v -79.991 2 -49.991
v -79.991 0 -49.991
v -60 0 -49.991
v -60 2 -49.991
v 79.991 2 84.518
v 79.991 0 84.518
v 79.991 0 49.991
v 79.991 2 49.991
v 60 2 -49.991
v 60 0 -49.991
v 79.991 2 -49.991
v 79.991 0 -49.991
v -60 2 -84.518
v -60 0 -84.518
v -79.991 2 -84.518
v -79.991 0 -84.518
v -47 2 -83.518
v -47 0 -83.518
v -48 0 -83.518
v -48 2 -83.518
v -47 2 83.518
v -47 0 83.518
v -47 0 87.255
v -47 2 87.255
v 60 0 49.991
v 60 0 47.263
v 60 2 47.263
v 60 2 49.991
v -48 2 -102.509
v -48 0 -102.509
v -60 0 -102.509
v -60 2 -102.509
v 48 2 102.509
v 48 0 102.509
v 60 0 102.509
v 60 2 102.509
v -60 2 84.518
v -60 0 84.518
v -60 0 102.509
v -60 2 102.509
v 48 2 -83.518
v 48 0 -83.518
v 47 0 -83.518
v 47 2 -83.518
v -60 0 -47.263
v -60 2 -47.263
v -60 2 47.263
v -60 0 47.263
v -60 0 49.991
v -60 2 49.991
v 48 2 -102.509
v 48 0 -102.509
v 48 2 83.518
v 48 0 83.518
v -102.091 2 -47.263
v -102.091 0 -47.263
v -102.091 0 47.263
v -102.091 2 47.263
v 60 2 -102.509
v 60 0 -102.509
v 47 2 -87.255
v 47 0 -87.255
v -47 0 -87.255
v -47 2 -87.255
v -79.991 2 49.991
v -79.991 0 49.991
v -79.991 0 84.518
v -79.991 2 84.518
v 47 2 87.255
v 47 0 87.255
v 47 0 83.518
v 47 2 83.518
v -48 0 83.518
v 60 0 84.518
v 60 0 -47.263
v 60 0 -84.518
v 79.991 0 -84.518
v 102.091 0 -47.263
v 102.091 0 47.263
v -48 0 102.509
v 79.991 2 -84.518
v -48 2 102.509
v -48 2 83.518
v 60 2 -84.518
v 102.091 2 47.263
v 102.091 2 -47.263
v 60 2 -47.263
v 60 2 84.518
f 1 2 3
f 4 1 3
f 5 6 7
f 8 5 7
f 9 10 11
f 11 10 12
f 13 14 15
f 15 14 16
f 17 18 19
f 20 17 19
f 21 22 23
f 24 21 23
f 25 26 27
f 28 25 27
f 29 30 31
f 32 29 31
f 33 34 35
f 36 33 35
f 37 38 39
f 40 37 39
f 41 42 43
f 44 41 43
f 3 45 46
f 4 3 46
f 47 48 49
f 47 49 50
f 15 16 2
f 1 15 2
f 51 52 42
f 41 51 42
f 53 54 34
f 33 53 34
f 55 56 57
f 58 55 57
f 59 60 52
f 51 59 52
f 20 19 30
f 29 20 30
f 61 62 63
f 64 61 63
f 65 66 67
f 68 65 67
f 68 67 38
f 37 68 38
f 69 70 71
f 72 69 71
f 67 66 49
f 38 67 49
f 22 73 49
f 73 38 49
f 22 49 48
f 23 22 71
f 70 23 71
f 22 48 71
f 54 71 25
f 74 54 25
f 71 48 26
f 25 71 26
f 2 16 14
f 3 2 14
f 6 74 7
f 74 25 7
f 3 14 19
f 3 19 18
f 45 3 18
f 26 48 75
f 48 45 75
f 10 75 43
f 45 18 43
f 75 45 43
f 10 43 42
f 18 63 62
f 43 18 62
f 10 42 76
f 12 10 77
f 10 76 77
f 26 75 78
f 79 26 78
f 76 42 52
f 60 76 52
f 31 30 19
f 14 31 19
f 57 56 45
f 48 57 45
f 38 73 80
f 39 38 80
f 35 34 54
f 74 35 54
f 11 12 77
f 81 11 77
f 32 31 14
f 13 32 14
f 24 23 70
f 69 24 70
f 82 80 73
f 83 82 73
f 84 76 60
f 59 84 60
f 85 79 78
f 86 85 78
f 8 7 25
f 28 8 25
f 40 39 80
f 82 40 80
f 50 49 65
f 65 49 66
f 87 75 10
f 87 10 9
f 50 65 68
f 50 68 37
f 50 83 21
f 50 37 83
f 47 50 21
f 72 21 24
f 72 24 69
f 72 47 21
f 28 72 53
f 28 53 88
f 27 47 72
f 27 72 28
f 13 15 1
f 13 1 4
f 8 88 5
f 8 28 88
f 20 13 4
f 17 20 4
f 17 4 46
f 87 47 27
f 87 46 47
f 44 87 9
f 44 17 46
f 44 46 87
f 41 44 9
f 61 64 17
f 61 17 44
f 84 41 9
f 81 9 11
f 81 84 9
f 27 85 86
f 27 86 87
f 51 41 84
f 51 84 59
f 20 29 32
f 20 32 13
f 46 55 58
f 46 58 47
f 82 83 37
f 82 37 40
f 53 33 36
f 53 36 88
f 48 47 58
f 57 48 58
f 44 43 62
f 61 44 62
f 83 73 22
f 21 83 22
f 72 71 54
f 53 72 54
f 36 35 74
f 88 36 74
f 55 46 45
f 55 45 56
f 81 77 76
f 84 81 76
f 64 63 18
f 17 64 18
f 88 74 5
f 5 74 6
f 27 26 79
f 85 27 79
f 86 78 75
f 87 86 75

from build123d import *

# Parameters (mm, degrees)
SKETCH1_W                      = 120
SKETCH1_H                      = 100
BASE_FLANGE1_DEPTH             = 2
EDGE_FLANGE1_STRIP_W           = 9.4732
EDGE_FLANGE1_STRIP_H           = 2
EDGE_FLANGE1_STRIP_CUT_DEPTH   = 120
EDGE_FLANGE1_STRIP_2_W         = 9.4732
EDGE_FLANGE1_STRIP_2_H         = 2
EDGE_FLANGE1_STRIP_CUT_2_DEPTH = 120
EDGE_FLANGE1_DEPTH             = 120
EDGE_FLANGE1_BEND_DEPTH        = 120
EDGE_FLANGE2_DEPTH             = 94.5268
EDGE_FLANGE2_BEND_DEPTH        = 94.5268
EDGE_FLANGE5_STRIP_W           = 9.4732
EDGE_FLANGE5_STRIP_H           = 2
EDGE_FLANGE5_STRIP_CUT_DEPTH   = 12
EDGE_FLANGE5_RELIEF_W          = 10.4732
EDGE_FLANGE5_RELIEF_H          = 1
EDGE_FLANGE5_RELIEF_CUT_DEPTH  = 2
EDGE_FLANGE5_DEPTH             = 12
EDGE_FLANGE6_STRIP_W           = 9.4732
EDGE_FLANGE6_STRIP_H           = 2
EDGE_FLANGE6_STRIP_CUT_DEPTH   = 12
EDGE_FLANGE6_RELIEF_W          = 10.4732
EDGE_FLANGE6_RELIEF_H          = 1
EDGE_FLANGE6_RELIEF_CUT_DEPTH  = 2
EDGE_FLANGE6_DEPTH             = 12
EDGE_FLANGE7_STRIP_W           = 9.4732
EDGE_FLANGE7_STRIP_H           = 2
EDGE_FLANGE7_STRIP_CUT_DEPTH   = 12
EDGE_FLANGE7_RELIEF_W          = 10.4732
EDGE_FLANGE7_RELIEF_H          = 1
EDGE_FLANGE7_RELIEF_CUT_DEPTH  = 2
EDGE_FLANGE7_DEPTH             = 12
EDGE_FLANGE8_STRIP_W           = 9.4732
EDGE_FLANGE8_STRIP_H           = 2
EDGE_FLANGE8_STRIP_CUT_DEPTH   = 12
EDGE_FLANGE8_RELIEF_W          = 10.4732
EDGE_FLANGE8_RELIEF_H          = 1
EDGE_FLANGE8_RELIEF_CUT_DEPTH  = 2
EDGE_FLANGE8_DEPTH             = 12
EDGE_FLANGE9_DEPTH             = 34.5268
EDGE_FLANGE9_BEND_DEPTH        = 34.5268
EDGE_FLANGE9_BEND_2_DEPTH      = 34.5268
EDGE_FLANGE9_BEND_3_DEPTH      = 34.5268
UNFOLD1_START                  = 2
UNFOLD1_DEPTH                  = 38
UNFOLD1_2_DEPTH                = 2


# Read off the part's stored shape, not the designer's step: Unfold1
# Sheet-metal steps are written as plain solids
with BuildPart() as part:
    # Sketch1 → Base-Flange1 (new body)
    with BuildSketch(Plane(origin=(0, 0, 0), x_dir=(1, 0, 0), z_dir=(0, 1, 0))):
        Rectangle(SKETCH1_W, SKETCH1_H)
    extrude(amount=BASE_FLANGE1_DEPTH)

    # Edge-Flange1 strip (across the edge) → Edge-Flange1 strip cut (cut)
    with BuildSketch(Plane(origin=(60, 2, -50), x_dir=(0, 0, 1), z_dir=(-1, 0, 0))):
        with Locations((-2, -1)):
            Rectangle(EDGE_FLANGE1_STRIP_W, EDGE_FLANGE1_STRIP_H)
    extrude(amount=EDGE_FLANGE1_STRIP_CUT_DEPTH, mode=Mode.SUBTRACT)

    # Edge-Flange1 strip 2 (across the edge) → Edge-Flange1 strip cut 2 (cut)
    with BuildSketch(Plane(origin=(-60, 2, 50), x_dir=(0, 0, -1), z_dir=(1, 0, 0))):
        with Locations((-2, -1)):
            Rectangle(EDGE_FLANGE1_STRIP_2_W, EDGE_FLANGE1_STRIP_2_H)
    extrude(amount=EDGE_FLANGE1_STRIP_CUT_2_DEPTH, mode=Mode.SUBTRACT)

    # Edge-Flange1 section (across the edge) → Edge-Flange1 (add)
    with BuildSketch(Plane(origin=(60, 2, -50), x_dir=(0, 0, 1), z_dir=(-1, 0, 0))):
        with BuildLine():
            Line((0, 0.7366), (0, 38))
            Line((0, 38), (2, 38))
            Line((2, 38), (2, 0.7366))
            ThreePointArc((2, 0.7366), (2.215745145, 0.215745145), (2.7366, 0))
            Line((2.7366, 0), (2.7366, -2))
            ThreePointArc((2.7366, -2), (0.801531583, -1.198468417), (0, 0.7366))
        make_face()
    extrude(amount=EDGE_FLANGE1_DEPTH)

    # Edge-Flange1 section 2 (across the edge) → Edge-Flange1 bend (add)
    with BuildSketch(Plane(origin=(-60, 2, 50), x_dir=(0, 0, -1), z_dir=(1, 0, 0))):
        with BuildLine():
            Line((0, 0.7366), (0, 38))
            Line((0, 38), (2, 38))
            Line((2, 38), (2, 0.7366))
            ThreePointArc((2, 0.7366), (2.215745145, 0.215745145), (2.7366, 0))
            Line((2.7366, 0), (2.7366, -2))
            ThreePointArc((2.7366, -2), (0.801531583, -1.198468417), (0, 0.7366))
        make_face()
    extrude(amount=EDGE_FLANGE1_BEND_DEPTH)

    # Edge-Flange2 section (across the edge) → Edge-Flange2 (add)
    with BuildSketch(Plane(origin=(-62.8366, 2, -47.2634), x_dir=(1, 0, 0), z_dir=(0, 0, 1))):
        with BuildLine():
            Line((-2, 0.7366), (-2, 38))
            Line((-2, 38), (0, 38))
            Line((0, 38), (0, 0.7366))
            ThreePointArc((0, 0.7366), (0.215745145, 0.215745145), (0.7366, 0))
            Line((0.7366, 0), (2.8366, 0))
            Line((2.8366, 0), (2.8366, -2))
            Line((2.8366, -2), (0.7366, -2))
            ThreePointArc((0.7366, -2), (-1.198468417, -1.198468417), (-2, 0.7366))
        make_face()
    extrude(amount=EDGE_FLANGE2_DEPTH)

    # Edge-Flange2 section 2 (across the edge) → Edge-Flange2 bend (add)
    with BuildSketch(Plane(origin=(62.8366, 2, 47.2634), x_dir=(-1, 0, 0), z_dir=(0, 0, -1))):
        with BuildLine():
            Line((-2, 0.7366), (-2, 38))
            Line((-2, 38), (0, 38))
            Line((0, 38), (0, 0.7366))
            ThreePointArc((0, 0.7366), (0.215745145, 0.215745145), (0.7366, 0))
            Line((0.7366, 0), (2.8366, 0))
            Line((2.8366, 0), (2.8366, -2))
            Line((2.8366, -2), (0.7366, -2))
            ThreePointArc((0.7366, -2), (-1.198468417, -1.198468417), (-2, 0.7366))
        make_face()
    extrude(amount=EDGE_FLANGE2_BEND_DEPTH)

    # Edge-Flange5 strip (across the edge) → Edge-Flange5 strip cut (cut)
    with BuildSketch(Plane(origin=(48, 40, 48), x_dir=(0, -1, 0), z_dir=(1, 0, 0))):
        with Locations((-2, -1)):
            Rectangle(EDGE_FLANGE5_STRIP_W, EDGE_FLANGE5_STRIP_H)
    extrude(amount=EDGE_FLANGE5_STRIP_CUT_DEPTH, mode=Mode.SUBTRACT)

    # Edge-Flange5 relief (on the sheet) → Edge-Flange5 relief cut (cut)
    with BuildSketch(Plane(origin=(48, 37.2634, 48), x_dir=(0, -1, 0), z_dir=(0, 0, -1))):
        with Locations((-4.2366, 0.5)):
            Rectangle(EDGE_FLANGE5_RELIEF_W, EDGE_FLANGE5_RELIEF_H)
    extrude(amount=-EDGE_FLANGE5_RELIEF_CUT_DEPTH, mode=Mode.SUBTRACT)

    # Edge-Flange5 section (across the edge) → Edge-Flange5 (add)
    with BuildSketch(Plane(origin=(48, 40, 48), x_dir=(0, -1, 0), z_dir=(1, 0, 0))):
        with BuildLine():
            Line((0, 0.7366), (0, 16))
            Line((0, 16), (2, 16))
            Line((2, 16), (2, 0.7366))
            ThreePointArc((2, 0.7366), (2.215745145, 0.215745145), (2.7366, 0))
            Line((2.7366, 0), (2.7366, -2))
            ThreePointArc((2.7366, -2), (0.801531583, -1.198468417), (0, 0.7366))
        make_face()
    extrude(amount=EDGE_FLANGE5_DEPTH)

    # Edge-Flange6 strip (across the edge) → Edge-Flange6 strip cut (cut)
    with BuildSketch(Plane(origin=(-60, 40, 48), x_dir=(0, -1, 0), z_dir=(1, 0, 0))):
        with Locations((-2, -1)):
            Rectangle(EDGE_FLANGE6_STRIP_W, EDGE_FLANGE6_STRIP_H)
    extrude(amount=EDGE_FLANGE6_STRIP_CUT_DEPTH, mode=Mode.SUBTRACT)

    # Edge-Flange6 relief (on the sheet) → Edge-Flange6 relief cut (cut)
    with BuildSketch(Plane(origin=(-60, 37.2634, 48), x_dir=(0, -1, 0), z_dir=(0, 0, -1))):
        with Locations((-4.2366, -12.5)):
            Rectangle(EDGE_FLANGE6_RELIEF_W, EDGE_FLANGE6_RELIEF_H)
    extrude(amount=-EDGE_FLANGE6_RELIEF_CUT_DEPTH, mode=Mode.SUBTRACT)

    # Edge-Flange6 section (across the edge) → Edge-Flange6 (add)
    with BuildSketch(Plane(origin=(-60, 40, 48), x_dir=(0, -1, 0), z_dir=(1, 0, 0))):
        with BuildLine():
            Line((0, 0.7366), (0, 16))
            Line((0, 16), (2, 16))
            Line((2, 16), (2, 0.7366))
            ThreePointArc((2, 0.7366), (2.215745145, 0.215745145), (2.7366, 0))
            Line((2.7366, 0), (2.7366, -2))
            ThreePointArc((2.7366, -2), (0.801531583, -1.198468417), (0, 0.7366))
        make_face()
    extrude(amount=EDGE_FLANGE6_DEPTH)

    # Edge-Flange7 strip (across the edge) → Edge-Flange7 strip cut (cut)
    with BuildSketch(Plane(origin=(-48, 40, -48), x_dir=(0, -1, 0), z_dir=(-1, 0, 0))):
        with Locations((-2, -1)):
            Rectangle(EDGE_FLANGE7_STRIP_W, EDGE_FLANGE7_STRIP_H)
    extrude(amount=EDGE_FLANGE7_STRIP_CUT_DEPTH, mode=Mode.SUBTRACT)

    # Edge-Flange7 relief (on the sheet) → Edge-Flange7 relief cut (cut)
    with BuildSketch(Plane(origin=(-48, 37.2634, -48), x_dir=(0, -1, 0), z_dir=(0, 0, 1))):
        with Locations((-4.2366, 0.5)):
            Rectangle(EDGE_FLANGE7_RELIEF_W, EDGE_FLANGE7_RELIEF_H)
    extrude(amount=-EDGE_FLANGE7_RELIEF_CUT_DEPTH, mode=Mode.SUBTRACT)

    # Edge-Flange7 section (across the edge) → Edge-Flange7 (add)
    with BuildSketch(Plane(origin=(-48, 40, -48), x_dir=(0, -1, 0), z_dir=(-1, 0, 0))):
        with BuildLine():
            Line((0, 0.7366), (0, 16))
            Line((0, 16), (2, 16))
            Line((2, 16), (2, 0.7366))
            ThreePointArc((2, 0.7366), (2.215745145, 0.215745145), (2.7366, 0))
            Line((2.7366, 0), (2.7366, -2))
            ThreePointArc((2.7366, -2), (0.801531583, -1.198468417), (0, 0.7366))
        make_face()
    extrude(amount=EDGE_FLANGE7_DEPTH)

    # Edge-Flange8 strip (across the edge) → Edge-Flange8 strip cut (cut)
    with BuildSketch(Plane(origin=(60, 40, -48), x_dir=(0, -1, 0), z_dir=(-1, 0, 0))):
        with Locations((-2, -1)):
            Rectangle(EDGE_FLANGE8_STRIP_W, EDGE_FLANGE8_STRIP_H)
    extrude(amount=EDGE_FLANGE8_STRIP_CUT_DEPTH, mode=Mode.SUBTRACT)

    # Edge-Flange8 relief (on the sheet) → Edge-Flange8 relief cut (cut)
    with BuildSketch(Plane(origin=(60, 37.2634, -48), x_dir=(0, -1, 0), z_dir=(0, 0, 1))):
        with Locations((-4.2366, -12.5)):
            Rectangle(EDGE_FLANGE8_RELIEF_W, EDGE_FLANGE8_RELIEF_H)
    extrude(amount=-EDGE_FLANGE8_RELIEF_CUT_DEPTH, mode=Mode.SUBTRACT)

    # Edge-Flange8 section (across the edge) → Edge-Flange8 (add)
    with BuildSketch(Plane(origin=(60, 40, -48), x_dir=(0, -1, 0), z_dir=(-1, 0, 0))):
        with BuildLine():
            Line((0, 0.7366), (0, 16))
            Line((0, 16), (2, 16))
            Line((2, 16), (2, 0.7366))
            ThreePointArc((2, 0.7366), (2.215745145, 0.215745145), (2.7366, 0))
            Line((2.7366, 0), (2.7366, -2))
            ThreePointArc((2.7366, -2), (0.801531583, -1.198468417), (0, 0.7366))
        make_face()
    extrude(amount=EDGE_FLANGE8_DEPTH)

    # Edge-Flange9 section (across the edge) → Edge-Flange9 (add)
    with BuildSketch(Plane(origin=(60.7366, 37.2634, 48), x_dir=(-1, 0, 0), z_dir=(0, -1, 0))):
        with BuildLine():
            Line((-2, 0.7366), (-2, 18))
            Line((-2, 18), (0, 18))
            Line((0, 18), (0, 0.7366))
            ThreePointArc((0, 0.7366), (0.215745145, 0.215745145), (0.7366, 0))
            Line((0.7366, 0), (0.7366, -2))
            ThreePointArc((0.7366, -2), (-1.198468417, -1.198468417), (-2, 0.7366))
        make_face()
    extrude(amount=EDGE_FLANGE9_DEPTH)

    # Edge-Flange9 section 2 (across the edge) → Edge-Flange9 bend (add)
    with BuildSketch(Plane(origin=(60.7366, 2.7366, -48), x_dir=(-1, 0, 0), z_dir=(0, 1, 0))):
        with BuildLine():
            Line((-2, 0.7366), (-2, 18))
            Line((-2, 18), (0, 18))
            Line((0, 18), (0, 0.7366))
            ThreePointArc((0, 0.7366), (0.215745145, 0.215745145), (0.7366, 0))
            Line((0.7366, 0), (0.7366, -2))
            ThreePointArc((0.7366, -2), (-1.198468417, -1.198468417), (-2, 0.7366))
        make_face()
    extrude(amount=EDGE_FLANGE9_BEND_DEPTH)

    # Edge-Flange9 section 3 (across the edge) → Edge-Flange9 bend 2 (add)
    with BuildSketch(Plane(origin=(-60.7366, 37.2634, -48), x_dir=(1, 0, 0), z_dir=(0, -1, 0))):
        with BuildLine():
            Line((-2, 0.7366), (-2, 18))
            Line((-2, 18), (0, 18))
            Line((0, 18), (0, 0.7366))
            ThreePointArc((0, 0.7366), (0.215745145, 0.215745145), (0.7366, 0))
            Line((0.7366, 0), (0.7366, -2))
            ThreePointArc((0.7366, -2), (-1.198468417, -1.198468417), (-2, 0.7366))
        make_face()
    extrude(amount=EDGE_FLANGE9_BEND_2_DEPTH)

    # Edge-Flange9 section 4 (across the edge) → Edge-Flange9 bend 3 (add)
    with BuildSketch(Plane(origin=(-60.7366, 2.7366, 48), x_dir=(1, 0, 0), z_dir=(0, 1, 0))):
        with BuildLine():
            Line((-2, 0.7366), (-2, 18))
            Line((-2, 18), (0, 18))
            Line((0, 18), (0, 0.7366))
            ThreePointArc((0, 0.7366), (0.215745145, 0.215745145), (0.7366, 0))
            Line((0.7366, 0), (0.7366, -2))
            ThreePointArc((0.7366, -2), (-1.198468417, -1.198468417), (-2, 0.7366))
        make_face()
    extrude(amount=EDGE_FLANGE9_BEND_3_DEPTH)

    # Unfold1 outline → Unfold1 (cut)
    with BuildSketch(Plane(origin=(0, 0, 0), x_dir=(1, 0, 0), z_dir=(0, 1, 0)).offset(UNFOLD1_START)):
        with BuildLine():
            Line((62.7366, -47.2634), (64.8366, -47.2634))
            Line((64.8366, -47.2634), (64.8366, 47.2634))
            Line((64.8366, 47.2634), (62.7366, 47.2634))
            ThreePointArc((62.7366, 47.2634), (61.935068417, 49.198468417), (60, 50))
            Line((60, 50), (-60, 50))
            ThreePointArc((-60, 50), (-61.935068417, 49.198468417), (-62.7366, 47.2634))
            Line((-62.7366, 47.2634), (-64.8366, 47.2634))
            Line((-64.8366, 47.2634), (-64.8366, -47.2634))
            Line((-64.8366, -47.2634), (-62.7366, -47.2634))
            ThreePointArc((-62.7366, -47.2634), (-61.935068417, -49.198468417), (-60, -50))
            Line((-60, -50), (60, -50))
            ThreePointArc((60, -50), (61.935068417, -49.198468417), (62.7366, -47.2634))
        make_face()
        with BuildLine():
            ThreePointArc((60.7366, -47.2634), (60.520854855, -47.784254855), (60, -48))
            Line((60, -48), (60, -47.2634))
            Line((60, -47.2634), (60.7366, -47.2634))
        make_face(mode=Mode.SUBTRACT)
        with BuildLine():
            Line((-60.7366, -47.2634), (-60, -47.2634))
            Line((-60, -47.2634), (-60, -48))
            ThreePointArc((-60, -48), (-60.520854855, -47.784254855), (-60.7366, -47.2634))
        make_face(mode=Mode.SUBTRACT)
        with BuildLine():
            Line((-60, 47.2634), (-60.7366, 47.2634))
            ThreePointArc((-60.7366, 47.2634), (-60.520854855, 47.784254855), (-60, 48))
            Line((-60, 48), (-60, 47.2634))
        make_face(mode=Mode.SUBTRACT)
        with BuildLine():
            Line((60.7366, 47.2634), (60, 47.2634))
            Line((60, 47.2634), (60, 48))
            ThreePointArc((60, 48), (60.520854855, 47.784254855), (60.7366, 47.2634))
        make_face(mode=Mode.SUBTRACT)
    extrude(amount=UNFOLD1_DEPTH, mode=Mode.SUBTRACT)

    # Unfold1 2 outline → Unfold1 2 (add)
    with BuildSketch(Plane(origin=(0, 0, 0), x_dir=(1, 0, 0), z_dir=(0, 1, 0))):
        Polygon((102.091244901, -47.2634), (102.091244901, 47.2634), (60, 47.2634), (60, 49.991244901), (79.991244901, 49.991244901), (79.991244901, 84.518044901), (60, 84.518044901), (60, 102.509289802), (48, 102.509289802), (48, 83.518044901), (47, 83.518044901), (47, 87.254644901), (-47, 87.254644901), (-47, 83.518044901), (-48, 83.518044901), (-48, 102.509289802), (-60, 102.509289802), (-60, 84.518044901), (-79.991244901, 84.518044901), (-79.991244901, 49.991244901), (-60, 49.991244901), (-60, 47.2634), (-102.091244901, 47.2634), (-102.091244901, -47.2634), (-60, -47.2634), (-60, -49.991244901), (-79.991244901, -49.991244901), (-79.991244901, -84.518044901), (-60, -84.518044901), (-60, -102.509289802), (-48, -102.509289802), (-48, -83.518044901), (-47, -83.518044901), (-47, -87.254644901), (47, -87.254644901), (47, -83.518044901), (48, -83.518044901), (48, -102.509289802), (60, -102.509289802), (60, -84.518044901), (79.991244901, -84.518044901), (79.991244901, -49.991244901), (60, -49.991244901), (60, -47.2634), align=None)
    extrude(amount=UNFOLD1_2_DEPTH)


solid = part.part
